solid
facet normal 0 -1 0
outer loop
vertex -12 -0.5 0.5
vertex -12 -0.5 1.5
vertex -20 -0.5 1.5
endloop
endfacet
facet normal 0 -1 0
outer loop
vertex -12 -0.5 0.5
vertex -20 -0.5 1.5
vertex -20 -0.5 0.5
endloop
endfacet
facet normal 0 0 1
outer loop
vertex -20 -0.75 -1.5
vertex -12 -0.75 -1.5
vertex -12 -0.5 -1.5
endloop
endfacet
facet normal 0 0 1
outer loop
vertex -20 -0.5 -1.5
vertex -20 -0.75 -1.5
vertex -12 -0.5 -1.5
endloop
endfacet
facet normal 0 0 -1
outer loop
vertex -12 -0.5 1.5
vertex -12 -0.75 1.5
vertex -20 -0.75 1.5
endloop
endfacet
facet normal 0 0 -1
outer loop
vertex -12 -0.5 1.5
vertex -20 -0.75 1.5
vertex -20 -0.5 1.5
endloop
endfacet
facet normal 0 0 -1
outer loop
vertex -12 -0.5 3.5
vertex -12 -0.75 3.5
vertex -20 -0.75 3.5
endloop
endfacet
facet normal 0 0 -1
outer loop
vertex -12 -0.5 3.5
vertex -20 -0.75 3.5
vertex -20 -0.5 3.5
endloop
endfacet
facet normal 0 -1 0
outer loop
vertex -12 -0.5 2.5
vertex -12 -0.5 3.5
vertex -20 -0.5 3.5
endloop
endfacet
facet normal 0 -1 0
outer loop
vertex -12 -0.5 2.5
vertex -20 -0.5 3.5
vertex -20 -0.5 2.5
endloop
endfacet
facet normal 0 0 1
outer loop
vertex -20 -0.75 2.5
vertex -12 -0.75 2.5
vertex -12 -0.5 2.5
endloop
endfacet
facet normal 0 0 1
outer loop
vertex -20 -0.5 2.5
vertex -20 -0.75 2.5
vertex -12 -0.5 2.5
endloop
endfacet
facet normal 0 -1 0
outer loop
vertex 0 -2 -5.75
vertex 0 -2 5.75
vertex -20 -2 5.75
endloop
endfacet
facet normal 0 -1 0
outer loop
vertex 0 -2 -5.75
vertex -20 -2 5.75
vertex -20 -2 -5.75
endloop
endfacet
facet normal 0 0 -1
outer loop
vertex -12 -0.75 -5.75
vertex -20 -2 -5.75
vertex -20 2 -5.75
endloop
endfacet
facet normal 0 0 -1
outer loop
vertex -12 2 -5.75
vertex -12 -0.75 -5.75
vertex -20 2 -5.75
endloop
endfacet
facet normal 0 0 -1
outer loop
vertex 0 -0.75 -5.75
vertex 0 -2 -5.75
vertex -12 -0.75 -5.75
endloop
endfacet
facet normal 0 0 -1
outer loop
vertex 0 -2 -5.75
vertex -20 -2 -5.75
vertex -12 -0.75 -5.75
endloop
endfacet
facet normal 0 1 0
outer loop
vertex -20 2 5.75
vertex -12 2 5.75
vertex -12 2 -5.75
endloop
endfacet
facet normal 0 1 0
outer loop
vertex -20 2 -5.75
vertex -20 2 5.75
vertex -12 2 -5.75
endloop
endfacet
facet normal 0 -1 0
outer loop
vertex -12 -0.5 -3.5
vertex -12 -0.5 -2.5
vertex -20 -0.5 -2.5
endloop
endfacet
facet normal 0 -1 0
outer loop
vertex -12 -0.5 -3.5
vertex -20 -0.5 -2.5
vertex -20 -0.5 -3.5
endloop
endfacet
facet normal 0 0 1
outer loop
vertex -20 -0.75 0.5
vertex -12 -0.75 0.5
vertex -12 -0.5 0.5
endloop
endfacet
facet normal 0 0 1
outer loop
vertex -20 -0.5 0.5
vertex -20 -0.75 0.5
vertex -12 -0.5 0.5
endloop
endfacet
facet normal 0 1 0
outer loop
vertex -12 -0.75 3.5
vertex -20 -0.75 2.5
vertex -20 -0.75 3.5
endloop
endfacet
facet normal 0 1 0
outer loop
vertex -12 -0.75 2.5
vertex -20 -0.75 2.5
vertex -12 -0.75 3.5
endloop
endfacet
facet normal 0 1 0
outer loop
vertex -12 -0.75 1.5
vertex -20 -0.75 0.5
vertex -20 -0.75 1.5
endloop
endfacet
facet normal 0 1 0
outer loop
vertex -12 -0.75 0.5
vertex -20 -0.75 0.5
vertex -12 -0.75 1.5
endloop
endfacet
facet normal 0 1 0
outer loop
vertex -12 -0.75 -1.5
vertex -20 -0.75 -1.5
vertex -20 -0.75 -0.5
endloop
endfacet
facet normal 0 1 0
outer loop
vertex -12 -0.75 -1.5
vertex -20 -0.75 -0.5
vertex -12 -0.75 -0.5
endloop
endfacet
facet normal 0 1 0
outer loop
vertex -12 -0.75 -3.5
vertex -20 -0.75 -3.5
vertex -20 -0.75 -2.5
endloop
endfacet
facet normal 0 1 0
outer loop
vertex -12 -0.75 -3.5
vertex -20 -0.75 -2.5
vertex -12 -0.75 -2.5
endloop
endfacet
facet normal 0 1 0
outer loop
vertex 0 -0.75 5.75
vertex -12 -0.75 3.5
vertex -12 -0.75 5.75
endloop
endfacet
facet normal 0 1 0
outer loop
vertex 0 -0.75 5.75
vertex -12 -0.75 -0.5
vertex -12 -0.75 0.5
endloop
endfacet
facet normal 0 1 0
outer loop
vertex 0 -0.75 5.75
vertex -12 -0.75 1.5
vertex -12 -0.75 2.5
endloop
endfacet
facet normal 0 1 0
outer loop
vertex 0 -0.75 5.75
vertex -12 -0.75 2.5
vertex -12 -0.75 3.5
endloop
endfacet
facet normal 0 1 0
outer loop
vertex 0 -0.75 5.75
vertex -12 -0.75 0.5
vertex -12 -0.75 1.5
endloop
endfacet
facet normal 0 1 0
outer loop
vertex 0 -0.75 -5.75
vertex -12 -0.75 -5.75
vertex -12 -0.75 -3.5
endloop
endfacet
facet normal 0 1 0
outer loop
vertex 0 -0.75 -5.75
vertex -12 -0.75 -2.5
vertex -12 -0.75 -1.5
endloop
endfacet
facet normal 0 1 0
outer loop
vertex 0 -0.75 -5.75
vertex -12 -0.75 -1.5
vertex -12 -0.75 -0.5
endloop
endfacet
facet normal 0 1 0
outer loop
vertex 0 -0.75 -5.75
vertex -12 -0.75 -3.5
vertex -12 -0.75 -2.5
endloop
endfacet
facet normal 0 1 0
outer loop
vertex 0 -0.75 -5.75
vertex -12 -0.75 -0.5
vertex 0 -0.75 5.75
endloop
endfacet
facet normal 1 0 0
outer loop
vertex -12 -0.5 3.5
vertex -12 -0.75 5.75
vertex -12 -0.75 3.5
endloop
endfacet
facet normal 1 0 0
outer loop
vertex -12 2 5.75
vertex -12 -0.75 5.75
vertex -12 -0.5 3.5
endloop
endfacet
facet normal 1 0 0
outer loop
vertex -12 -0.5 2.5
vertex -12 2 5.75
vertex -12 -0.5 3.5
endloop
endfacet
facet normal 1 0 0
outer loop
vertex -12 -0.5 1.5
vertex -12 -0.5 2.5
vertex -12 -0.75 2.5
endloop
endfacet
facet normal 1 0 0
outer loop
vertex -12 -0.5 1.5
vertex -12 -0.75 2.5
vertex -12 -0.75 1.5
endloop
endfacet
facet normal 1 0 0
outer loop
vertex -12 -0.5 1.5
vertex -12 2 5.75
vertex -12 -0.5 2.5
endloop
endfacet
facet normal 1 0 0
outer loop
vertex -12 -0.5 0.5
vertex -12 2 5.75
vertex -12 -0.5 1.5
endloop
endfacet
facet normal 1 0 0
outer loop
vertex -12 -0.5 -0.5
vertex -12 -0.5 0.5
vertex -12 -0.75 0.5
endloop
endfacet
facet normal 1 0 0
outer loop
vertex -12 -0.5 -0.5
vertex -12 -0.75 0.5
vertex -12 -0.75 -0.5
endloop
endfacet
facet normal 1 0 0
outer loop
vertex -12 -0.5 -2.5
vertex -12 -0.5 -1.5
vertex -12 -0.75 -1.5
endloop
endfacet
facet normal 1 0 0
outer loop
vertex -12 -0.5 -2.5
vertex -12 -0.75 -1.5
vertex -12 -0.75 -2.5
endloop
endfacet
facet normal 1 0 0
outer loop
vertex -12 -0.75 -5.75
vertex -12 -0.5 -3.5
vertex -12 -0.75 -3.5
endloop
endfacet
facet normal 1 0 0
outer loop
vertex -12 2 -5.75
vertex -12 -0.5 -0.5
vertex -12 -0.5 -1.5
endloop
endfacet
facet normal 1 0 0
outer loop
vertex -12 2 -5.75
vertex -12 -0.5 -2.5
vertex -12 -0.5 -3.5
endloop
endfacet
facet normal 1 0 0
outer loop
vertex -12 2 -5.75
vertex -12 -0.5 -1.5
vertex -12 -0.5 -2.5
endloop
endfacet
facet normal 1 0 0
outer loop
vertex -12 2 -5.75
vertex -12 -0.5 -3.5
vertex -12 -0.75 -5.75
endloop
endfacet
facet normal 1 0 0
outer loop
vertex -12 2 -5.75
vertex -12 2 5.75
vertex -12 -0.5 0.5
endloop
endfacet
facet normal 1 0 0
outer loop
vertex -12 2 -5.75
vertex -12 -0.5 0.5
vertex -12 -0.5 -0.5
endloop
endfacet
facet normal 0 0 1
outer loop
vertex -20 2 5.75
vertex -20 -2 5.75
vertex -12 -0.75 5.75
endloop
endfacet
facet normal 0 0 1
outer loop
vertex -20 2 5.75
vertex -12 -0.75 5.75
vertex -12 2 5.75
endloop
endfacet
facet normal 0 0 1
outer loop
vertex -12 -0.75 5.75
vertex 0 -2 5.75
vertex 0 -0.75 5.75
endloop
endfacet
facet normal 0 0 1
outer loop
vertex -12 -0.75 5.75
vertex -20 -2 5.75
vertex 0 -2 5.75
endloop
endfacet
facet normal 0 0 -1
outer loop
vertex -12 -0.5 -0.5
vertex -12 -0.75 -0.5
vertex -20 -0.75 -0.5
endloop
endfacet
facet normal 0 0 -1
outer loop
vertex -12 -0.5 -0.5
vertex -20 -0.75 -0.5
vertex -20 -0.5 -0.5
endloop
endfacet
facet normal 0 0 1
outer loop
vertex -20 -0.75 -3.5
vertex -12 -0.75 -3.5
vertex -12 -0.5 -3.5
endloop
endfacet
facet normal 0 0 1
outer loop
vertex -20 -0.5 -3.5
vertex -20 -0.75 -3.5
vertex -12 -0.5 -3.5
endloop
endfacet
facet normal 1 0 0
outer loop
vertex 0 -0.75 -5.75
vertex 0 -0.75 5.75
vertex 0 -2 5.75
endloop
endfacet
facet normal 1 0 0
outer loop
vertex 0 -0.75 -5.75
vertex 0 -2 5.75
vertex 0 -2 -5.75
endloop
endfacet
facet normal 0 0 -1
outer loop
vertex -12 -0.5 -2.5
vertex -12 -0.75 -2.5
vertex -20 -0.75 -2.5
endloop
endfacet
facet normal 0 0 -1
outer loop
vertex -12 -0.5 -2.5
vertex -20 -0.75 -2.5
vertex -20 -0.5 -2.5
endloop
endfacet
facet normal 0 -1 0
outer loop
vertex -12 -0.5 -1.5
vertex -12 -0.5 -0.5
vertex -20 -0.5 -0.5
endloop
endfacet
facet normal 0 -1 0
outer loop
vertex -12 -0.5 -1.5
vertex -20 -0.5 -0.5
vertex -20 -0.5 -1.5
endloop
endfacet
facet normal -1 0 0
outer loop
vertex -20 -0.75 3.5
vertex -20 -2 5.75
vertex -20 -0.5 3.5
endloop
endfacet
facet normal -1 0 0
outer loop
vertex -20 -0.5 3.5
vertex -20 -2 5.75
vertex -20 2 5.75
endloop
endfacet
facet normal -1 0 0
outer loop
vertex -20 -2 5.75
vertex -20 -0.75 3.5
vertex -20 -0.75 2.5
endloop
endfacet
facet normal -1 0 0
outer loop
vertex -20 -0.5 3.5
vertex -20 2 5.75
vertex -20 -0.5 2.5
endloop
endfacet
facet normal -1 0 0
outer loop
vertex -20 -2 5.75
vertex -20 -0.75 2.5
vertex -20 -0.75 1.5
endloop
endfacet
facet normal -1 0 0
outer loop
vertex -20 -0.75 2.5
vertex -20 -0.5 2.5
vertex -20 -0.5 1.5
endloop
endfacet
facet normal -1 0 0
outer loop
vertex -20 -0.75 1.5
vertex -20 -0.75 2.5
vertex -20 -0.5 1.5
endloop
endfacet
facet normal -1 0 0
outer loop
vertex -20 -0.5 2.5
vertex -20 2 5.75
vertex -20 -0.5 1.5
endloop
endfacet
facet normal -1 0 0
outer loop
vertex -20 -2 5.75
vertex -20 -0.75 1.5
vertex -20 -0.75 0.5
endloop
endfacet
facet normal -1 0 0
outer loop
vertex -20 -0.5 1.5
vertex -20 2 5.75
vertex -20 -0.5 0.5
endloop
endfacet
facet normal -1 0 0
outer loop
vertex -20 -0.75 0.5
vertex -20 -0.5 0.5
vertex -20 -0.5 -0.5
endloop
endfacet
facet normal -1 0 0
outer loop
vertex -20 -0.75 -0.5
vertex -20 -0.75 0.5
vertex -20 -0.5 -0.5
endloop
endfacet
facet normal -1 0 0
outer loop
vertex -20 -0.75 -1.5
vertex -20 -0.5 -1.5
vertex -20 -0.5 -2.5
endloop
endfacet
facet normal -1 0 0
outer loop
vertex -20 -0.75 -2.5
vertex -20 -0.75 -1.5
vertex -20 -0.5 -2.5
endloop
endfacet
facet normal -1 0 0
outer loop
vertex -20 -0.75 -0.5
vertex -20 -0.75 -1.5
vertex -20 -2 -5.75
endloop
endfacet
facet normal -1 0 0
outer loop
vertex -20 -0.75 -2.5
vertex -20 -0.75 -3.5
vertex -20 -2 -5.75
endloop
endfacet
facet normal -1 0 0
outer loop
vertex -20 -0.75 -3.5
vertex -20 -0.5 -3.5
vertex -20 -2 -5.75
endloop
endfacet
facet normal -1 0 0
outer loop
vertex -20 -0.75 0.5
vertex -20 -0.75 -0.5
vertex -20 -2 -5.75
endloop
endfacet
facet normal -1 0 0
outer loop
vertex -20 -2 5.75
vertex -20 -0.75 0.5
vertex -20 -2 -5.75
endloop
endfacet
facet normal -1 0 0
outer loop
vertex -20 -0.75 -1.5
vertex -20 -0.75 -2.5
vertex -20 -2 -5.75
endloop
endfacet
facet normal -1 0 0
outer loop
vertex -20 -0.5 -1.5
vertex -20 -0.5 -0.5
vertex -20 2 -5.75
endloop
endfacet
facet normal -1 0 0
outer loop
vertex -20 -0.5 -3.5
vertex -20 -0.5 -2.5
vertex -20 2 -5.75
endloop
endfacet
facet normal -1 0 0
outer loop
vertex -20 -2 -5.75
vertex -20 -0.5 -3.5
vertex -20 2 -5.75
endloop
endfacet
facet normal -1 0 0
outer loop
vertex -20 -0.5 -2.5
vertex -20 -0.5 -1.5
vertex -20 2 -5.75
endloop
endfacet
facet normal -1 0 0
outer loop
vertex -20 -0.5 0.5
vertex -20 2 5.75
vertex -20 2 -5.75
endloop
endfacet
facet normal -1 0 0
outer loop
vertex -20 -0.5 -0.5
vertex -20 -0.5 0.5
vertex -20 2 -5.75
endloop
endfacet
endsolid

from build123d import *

# Parameters (mm, degrees)
INSULATOR_BODY_SKETCH_W    = 11.5
INSULATOR_BODY_SKETCH_H    = 4
INSULATOR_BODY_DEPTH       = 20
INSULATOR_TONGUE_SKETCH_W  = 12
INSULATOR_TONGUE_SKETCH_H  = 11.5
INSULATOR_TONGUE_DEPTH     = 2.75
CONTACT_SLOT_SKETCH_W      = 1
CONTACT_SLOT_SKETCH_H      = 0.25
CONTACT_SLOT_DEPTH         = 9
CONTACT_SLOT_PATTERN_COUNT = 4
CONTACT_SLOT_PATTERN_PITCH = 2


with BuildPart() as part:
    # Insulator_body_sketch → Insulator_body (new body)
    with BuildSketch(Plane(origin=(0, 0, 0), x_dir=(0, 0, -1), z_dir=(1, 0, 0))):
        Rectangle(INSULATOR_BODY_SKETCH_W, INSULATOR_BODY_SKETCH_H)
    extrude(amount=-INSULATOR_BODY_DEPTH)

    # Insulator_tongue_sketch → Insulator_tongue (cut)
    with BuildSketch(Plane(origin=(0, 2, 0), x_dir=(1, 0, 0), z_dir=(0, 1, 0))):
        with Locations((-6, 0)):
            Rectangle(INSULATOR_TONGUE_SKETCH_W, INSULATOR_TONGUE_SKETCH_H)
    extrude(amount=-INSULATOR_TONGUE_DEPTH, mode=Mode.SUBTRACT)

    # Contact_slot_sketch → Contact_slot (cut, through all)
    with BuildSketch(Plane(origin=(-12, 0, 0), x_dir=(0, 0, -1), z_dir=(1, 0, 0))):
        with Locations((-3, -0.625)):
            Rectangle(CONTACT_SLOT_SKETCH_W, CONTACT_SLOT_SKETCH_H)
    contact_slot = extrude(amount=-CONTACT_SLOT_DEPTH, mode=Mode.SUBTRACT)

    # Contact_slot_pattern: Contact_slot ×4
    with Locations(*[(0, 0, -i * CONTACT_SLOT_PATTERN_PITCH) for i in range(1, CONTACT_SLOT_PATTERN_COUNT)]):
        add(contact_slot, mode=Mode.SUBTRACT)


solid = part.part
